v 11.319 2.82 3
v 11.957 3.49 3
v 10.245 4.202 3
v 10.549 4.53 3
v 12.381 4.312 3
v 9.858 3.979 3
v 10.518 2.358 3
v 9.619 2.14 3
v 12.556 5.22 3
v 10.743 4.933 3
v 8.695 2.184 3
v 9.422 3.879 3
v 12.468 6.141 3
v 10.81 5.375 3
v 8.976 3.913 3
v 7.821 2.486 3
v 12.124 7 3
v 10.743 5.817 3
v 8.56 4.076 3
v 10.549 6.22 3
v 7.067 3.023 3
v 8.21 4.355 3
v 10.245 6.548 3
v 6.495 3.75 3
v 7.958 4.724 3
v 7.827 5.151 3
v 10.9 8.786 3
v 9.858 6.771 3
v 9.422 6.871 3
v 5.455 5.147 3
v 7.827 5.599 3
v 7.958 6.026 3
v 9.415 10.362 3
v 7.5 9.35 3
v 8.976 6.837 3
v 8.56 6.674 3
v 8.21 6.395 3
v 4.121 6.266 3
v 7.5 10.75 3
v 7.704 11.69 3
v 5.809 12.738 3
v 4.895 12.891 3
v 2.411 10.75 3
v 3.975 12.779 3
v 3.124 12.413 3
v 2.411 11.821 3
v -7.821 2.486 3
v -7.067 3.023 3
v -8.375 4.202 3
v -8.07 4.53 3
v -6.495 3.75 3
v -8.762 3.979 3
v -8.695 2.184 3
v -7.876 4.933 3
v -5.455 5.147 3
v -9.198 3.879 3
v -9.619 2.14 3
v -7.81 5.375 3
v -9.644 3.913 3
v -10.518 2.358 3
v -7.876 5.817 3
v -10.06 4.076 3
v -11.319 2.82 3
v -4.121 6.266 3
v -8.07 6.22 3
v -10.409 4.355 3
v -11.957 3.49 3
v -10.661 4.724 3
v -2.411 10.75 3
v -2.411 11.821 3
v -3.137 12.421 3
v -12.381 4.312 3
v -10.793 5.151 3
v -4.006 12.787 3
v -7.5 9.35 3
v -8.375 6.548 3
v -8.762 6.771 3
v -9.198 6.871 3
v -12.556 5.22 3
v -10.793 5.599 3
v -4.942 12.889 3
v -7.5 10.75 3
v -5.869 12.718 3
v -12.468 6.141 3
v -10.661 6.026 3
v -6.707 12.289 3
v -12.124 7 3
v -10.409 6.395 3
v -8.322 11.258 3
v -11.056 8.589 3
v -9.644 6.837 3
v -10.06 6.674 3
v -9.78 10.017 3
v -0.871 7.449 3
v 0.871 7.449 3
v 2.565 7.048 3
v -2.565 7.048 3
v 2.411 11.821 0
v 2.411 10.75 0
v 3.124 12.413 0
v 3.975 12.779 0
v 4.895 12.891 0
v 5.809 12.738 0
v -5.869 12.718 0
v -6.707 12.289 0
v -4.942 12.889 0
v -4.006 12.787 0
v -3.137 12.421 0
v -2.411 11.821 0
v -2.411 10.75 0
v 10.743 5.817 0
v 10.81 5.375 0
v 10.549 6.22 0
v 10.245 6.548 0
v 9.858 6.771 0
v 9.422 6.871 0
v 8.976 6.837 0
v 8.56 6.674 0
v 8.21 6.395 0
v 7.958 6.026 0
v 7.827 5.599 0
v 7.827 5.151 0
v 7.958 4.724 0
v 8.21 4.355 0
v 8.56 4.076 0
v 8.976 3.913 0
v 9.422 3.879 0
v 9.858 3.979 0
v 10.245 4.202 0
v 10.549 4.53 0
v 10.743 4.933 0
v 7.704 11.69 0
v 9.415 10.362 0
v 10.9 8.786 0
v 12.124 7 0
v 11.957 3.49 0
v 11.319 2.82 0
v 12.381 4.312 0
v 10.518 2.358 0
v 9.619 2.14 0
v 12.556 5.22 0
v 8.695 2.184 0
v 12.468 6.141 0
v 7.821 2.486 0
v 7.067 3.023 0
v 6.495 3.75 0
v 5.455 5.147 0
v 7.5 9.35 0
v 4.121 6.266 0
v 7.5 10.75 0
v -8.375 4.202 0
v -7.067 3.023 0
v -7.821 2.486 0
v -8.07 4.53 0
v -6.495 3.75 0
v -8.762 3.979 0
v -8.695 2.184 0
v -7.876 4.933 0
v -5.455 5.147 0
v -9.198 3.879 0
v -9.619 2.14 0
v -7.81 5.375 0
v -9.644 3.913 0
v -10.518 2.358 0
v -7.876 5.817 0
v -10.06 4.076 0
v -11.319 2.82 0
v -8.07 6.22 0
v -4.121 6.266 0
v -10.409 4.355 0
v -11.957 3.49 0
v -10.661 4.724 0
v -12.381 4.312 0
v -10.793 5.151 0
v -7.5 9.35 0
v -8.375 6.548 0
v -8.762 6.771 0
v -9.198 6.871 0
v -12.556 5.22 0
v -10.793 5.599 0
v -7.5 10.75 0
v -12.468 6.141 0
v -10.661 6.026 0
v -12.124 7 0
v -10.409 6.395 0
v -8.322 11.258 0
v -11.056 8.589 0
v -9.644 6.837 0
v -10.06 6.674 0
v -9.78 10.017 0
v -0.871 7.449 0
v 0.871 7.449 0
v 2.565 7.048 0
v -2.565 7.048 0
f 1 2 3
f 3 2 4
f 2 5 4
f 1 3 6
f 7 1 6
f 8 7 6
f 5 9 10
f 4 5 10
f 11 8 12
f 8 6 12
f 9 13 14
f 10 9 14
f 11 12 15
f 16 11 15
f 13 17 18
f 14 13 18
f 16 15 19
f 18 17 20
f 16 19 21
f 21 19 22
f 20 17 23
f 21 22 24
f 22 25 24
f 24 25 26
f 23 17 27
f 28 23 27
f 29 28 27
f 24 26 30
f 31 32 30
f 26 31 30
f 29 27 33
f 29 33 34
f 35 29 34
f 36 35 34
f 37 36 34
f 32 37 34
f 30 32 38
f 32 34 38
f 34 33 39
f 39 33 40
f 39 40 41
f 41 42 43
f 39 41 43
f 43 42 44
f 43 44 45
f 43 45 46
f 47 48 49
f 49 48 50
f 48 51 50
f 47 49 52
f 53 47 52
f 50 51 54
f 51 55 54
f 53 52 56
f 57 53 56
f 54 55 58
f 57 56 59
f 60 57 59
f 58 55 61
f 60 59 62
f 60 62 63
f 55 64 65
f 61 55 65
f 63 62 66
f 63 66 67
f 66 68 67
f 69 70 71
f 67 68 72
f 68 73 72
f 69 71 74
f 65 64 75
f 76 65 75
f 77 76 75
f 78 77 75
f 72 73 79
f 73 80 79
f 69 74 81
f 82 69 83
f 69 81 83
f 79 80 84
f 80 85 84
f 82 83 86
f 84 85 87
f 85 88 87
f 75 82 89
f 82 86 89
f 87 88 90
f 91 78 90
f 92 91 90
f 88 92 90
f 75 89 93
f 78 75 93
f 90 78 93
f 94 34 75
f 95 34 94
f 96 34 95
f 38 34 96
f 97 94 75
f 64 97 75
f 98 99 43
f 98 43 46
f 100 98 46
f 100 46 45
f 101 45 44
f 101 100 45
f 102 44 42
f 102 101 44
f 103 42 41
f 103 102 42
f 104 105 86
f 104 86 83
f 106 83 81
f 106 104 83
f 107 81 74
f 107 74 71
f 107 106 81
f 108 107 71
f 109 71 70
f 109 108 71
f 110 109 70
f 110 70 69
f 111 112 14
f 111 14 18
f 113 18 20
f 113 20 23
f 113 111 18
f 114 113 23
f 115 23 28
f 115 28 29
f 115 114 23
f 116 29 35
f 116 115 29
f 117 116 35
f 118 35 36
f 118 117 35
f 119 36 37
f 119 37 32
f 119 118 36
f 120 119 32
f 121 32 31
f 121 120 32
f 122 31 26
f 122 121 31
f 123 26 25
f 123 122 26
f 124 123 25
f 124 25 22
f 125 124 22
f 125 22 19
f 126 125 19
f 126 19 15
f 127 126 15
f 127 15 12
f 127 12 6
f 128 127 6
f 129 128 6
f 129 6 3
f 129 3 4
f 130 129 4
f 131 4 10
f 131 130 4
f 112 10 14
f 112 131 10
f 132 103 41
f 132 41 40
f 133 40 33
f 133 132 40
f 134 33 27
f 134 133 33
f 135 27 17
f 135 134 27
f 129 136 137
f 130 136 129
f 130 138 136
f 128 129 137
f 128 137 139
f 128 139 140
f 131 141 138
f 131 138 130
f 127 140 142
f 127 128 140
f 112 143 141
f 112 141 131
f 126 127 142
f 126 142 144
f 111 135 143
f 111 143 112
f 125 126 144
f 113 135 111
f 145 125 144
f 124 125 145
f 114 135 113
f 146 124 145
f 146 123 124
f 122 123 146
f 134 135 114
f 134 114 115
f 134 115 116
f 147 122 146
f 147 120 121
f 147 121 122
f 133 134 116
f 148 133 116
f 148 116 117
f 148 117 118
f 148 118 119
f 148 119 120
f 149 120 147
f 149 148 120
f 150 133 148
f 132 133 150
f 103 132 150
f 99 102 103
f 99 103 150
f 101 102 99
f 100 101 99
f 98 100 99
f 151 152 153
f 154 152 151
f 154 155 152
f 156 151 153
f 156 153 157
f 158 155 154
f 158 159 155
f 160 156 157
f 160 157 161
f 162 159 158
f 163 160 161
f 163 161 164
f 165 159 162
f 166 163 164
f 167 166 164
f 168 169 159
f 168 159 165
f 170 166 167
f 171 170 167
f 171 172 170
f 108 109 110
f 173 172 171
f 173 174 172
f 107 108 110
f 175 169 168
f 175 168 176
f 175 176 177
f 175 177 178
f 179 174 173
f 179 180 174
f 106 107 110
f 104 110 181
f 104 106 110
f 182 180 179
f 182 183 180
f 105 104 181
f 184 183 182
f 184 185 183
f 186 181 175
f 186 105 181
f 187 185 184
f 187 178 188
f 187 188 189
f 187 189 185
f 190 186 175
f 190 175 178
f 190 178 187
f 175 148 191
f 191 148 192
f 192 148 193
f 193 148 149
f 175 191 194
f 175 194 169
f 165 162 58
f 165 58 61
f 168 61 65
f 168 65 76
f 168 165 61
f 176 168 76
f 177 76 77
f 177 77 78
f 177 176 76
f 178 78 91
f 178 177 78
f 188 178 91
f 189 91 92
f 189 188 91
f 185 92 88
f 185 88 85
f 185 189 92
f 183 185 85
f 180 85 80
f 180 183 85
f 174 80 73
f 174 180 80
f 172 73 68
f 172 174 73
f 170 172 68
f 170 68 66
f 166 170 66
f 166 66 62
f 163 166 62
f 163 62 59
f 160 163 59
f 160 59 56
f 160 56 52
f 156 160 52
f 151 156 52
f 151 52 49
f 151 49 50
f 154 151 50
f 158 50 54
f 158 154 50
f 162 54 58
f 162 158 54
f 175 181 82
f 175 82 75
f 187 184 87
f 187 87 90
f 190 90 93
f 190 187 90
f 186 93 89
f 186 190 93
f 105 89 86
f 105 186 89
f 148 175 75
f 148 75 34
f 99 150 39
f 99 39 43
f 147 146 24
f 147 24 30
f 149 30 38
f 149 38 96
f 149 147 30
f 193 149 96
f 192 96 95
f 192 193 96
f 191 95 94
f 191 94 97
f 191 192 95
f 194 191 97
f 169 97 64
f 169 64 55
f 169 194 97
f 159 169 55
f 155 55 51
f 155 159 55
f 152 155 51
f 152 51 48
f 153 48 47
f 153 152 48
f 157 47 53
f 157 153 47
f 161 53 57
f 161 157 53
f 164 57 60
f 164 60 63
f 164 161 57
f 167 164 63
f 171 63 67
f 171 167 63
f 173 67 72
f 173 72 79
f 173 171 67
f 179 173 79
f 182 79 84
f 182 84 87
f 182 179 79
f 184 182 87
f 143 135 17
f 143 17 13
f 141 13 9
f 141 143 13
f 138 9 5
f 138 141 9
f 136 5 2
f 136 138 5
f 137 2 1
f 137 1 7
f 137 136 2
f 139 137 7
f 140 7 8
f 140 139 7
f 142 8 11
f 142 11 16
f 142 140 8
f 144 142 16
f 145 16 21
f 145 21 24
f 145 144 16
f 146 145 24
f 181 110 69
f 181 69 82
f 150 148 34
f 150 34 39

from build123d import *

# Parameters (mm, degrees)
ESQUISSE1_R        = 1.5
BOSS_EXTRU_2_DEPTH = 3


with BuildPart() as part:
    # Esquisse1 → Boss.-Extru.2 (new body)
    with BuildSketch(Plane.XY):
        with BuildLine():
            Line((-2.411034891, 11.820685714), (-2.411034891, 10.75))
            Line((-2.411034891, 10.75), (-7.5, 10.75))
            Line((-7.5, 10.75), (-7.5, 9.35))
            Line((-7.5, 9.35), (7.5, 9.35))
            Line((7.5, 9.35), (7.5, 10.75))
            Line((7.5, 10.75), (2.411034891, 10.75))
            Line((2.411034891, 10.75), (2.411034891, 11.820685714))
            ThreePointArc((2.411034891, 11.820685714), (3.975330286, 12.779130538), (5.80943088, 12.737759334))
            ThreePointArc((5.80943088, 12.737759334), (9.414650572, 10.36167721), (12.124355653, 7))
            ThreePointArc((12.124355653, 7), (10.934773091, 2.560417438), (6.495190528, 3.75))
            ThreePointArc((6.495190528, 3.75), (0, 7.5), (-6.495190528, 3.75))
            ThreePointArc((-6.495190528, 3.75), (-10.934773091, 2.560417438), (-12.124355653, 7))
            ThreePointArc((-12.124355653, 7), (-9.780131311, 10.017436376), (-6.707371512, 12.288660114))
            ThreePointArc((-6.707371512, 12.288660114), (-4.47014813, 12.872261577), (-2.411034891, 11.820685714))
        make_face()
        with Locations((9.309773091, 5.375)):
            Circle(ESQUISSE1_R, mode=Mode.SUBTRACT)
        with Locations((-9.309773091, 5.375)):
            Circle(ESQUISSE1_R, mode=Mode.SUBTRACT)
    extrude(amount=BOSS_EXTRU_2_DEPTH)


solid = part.part
